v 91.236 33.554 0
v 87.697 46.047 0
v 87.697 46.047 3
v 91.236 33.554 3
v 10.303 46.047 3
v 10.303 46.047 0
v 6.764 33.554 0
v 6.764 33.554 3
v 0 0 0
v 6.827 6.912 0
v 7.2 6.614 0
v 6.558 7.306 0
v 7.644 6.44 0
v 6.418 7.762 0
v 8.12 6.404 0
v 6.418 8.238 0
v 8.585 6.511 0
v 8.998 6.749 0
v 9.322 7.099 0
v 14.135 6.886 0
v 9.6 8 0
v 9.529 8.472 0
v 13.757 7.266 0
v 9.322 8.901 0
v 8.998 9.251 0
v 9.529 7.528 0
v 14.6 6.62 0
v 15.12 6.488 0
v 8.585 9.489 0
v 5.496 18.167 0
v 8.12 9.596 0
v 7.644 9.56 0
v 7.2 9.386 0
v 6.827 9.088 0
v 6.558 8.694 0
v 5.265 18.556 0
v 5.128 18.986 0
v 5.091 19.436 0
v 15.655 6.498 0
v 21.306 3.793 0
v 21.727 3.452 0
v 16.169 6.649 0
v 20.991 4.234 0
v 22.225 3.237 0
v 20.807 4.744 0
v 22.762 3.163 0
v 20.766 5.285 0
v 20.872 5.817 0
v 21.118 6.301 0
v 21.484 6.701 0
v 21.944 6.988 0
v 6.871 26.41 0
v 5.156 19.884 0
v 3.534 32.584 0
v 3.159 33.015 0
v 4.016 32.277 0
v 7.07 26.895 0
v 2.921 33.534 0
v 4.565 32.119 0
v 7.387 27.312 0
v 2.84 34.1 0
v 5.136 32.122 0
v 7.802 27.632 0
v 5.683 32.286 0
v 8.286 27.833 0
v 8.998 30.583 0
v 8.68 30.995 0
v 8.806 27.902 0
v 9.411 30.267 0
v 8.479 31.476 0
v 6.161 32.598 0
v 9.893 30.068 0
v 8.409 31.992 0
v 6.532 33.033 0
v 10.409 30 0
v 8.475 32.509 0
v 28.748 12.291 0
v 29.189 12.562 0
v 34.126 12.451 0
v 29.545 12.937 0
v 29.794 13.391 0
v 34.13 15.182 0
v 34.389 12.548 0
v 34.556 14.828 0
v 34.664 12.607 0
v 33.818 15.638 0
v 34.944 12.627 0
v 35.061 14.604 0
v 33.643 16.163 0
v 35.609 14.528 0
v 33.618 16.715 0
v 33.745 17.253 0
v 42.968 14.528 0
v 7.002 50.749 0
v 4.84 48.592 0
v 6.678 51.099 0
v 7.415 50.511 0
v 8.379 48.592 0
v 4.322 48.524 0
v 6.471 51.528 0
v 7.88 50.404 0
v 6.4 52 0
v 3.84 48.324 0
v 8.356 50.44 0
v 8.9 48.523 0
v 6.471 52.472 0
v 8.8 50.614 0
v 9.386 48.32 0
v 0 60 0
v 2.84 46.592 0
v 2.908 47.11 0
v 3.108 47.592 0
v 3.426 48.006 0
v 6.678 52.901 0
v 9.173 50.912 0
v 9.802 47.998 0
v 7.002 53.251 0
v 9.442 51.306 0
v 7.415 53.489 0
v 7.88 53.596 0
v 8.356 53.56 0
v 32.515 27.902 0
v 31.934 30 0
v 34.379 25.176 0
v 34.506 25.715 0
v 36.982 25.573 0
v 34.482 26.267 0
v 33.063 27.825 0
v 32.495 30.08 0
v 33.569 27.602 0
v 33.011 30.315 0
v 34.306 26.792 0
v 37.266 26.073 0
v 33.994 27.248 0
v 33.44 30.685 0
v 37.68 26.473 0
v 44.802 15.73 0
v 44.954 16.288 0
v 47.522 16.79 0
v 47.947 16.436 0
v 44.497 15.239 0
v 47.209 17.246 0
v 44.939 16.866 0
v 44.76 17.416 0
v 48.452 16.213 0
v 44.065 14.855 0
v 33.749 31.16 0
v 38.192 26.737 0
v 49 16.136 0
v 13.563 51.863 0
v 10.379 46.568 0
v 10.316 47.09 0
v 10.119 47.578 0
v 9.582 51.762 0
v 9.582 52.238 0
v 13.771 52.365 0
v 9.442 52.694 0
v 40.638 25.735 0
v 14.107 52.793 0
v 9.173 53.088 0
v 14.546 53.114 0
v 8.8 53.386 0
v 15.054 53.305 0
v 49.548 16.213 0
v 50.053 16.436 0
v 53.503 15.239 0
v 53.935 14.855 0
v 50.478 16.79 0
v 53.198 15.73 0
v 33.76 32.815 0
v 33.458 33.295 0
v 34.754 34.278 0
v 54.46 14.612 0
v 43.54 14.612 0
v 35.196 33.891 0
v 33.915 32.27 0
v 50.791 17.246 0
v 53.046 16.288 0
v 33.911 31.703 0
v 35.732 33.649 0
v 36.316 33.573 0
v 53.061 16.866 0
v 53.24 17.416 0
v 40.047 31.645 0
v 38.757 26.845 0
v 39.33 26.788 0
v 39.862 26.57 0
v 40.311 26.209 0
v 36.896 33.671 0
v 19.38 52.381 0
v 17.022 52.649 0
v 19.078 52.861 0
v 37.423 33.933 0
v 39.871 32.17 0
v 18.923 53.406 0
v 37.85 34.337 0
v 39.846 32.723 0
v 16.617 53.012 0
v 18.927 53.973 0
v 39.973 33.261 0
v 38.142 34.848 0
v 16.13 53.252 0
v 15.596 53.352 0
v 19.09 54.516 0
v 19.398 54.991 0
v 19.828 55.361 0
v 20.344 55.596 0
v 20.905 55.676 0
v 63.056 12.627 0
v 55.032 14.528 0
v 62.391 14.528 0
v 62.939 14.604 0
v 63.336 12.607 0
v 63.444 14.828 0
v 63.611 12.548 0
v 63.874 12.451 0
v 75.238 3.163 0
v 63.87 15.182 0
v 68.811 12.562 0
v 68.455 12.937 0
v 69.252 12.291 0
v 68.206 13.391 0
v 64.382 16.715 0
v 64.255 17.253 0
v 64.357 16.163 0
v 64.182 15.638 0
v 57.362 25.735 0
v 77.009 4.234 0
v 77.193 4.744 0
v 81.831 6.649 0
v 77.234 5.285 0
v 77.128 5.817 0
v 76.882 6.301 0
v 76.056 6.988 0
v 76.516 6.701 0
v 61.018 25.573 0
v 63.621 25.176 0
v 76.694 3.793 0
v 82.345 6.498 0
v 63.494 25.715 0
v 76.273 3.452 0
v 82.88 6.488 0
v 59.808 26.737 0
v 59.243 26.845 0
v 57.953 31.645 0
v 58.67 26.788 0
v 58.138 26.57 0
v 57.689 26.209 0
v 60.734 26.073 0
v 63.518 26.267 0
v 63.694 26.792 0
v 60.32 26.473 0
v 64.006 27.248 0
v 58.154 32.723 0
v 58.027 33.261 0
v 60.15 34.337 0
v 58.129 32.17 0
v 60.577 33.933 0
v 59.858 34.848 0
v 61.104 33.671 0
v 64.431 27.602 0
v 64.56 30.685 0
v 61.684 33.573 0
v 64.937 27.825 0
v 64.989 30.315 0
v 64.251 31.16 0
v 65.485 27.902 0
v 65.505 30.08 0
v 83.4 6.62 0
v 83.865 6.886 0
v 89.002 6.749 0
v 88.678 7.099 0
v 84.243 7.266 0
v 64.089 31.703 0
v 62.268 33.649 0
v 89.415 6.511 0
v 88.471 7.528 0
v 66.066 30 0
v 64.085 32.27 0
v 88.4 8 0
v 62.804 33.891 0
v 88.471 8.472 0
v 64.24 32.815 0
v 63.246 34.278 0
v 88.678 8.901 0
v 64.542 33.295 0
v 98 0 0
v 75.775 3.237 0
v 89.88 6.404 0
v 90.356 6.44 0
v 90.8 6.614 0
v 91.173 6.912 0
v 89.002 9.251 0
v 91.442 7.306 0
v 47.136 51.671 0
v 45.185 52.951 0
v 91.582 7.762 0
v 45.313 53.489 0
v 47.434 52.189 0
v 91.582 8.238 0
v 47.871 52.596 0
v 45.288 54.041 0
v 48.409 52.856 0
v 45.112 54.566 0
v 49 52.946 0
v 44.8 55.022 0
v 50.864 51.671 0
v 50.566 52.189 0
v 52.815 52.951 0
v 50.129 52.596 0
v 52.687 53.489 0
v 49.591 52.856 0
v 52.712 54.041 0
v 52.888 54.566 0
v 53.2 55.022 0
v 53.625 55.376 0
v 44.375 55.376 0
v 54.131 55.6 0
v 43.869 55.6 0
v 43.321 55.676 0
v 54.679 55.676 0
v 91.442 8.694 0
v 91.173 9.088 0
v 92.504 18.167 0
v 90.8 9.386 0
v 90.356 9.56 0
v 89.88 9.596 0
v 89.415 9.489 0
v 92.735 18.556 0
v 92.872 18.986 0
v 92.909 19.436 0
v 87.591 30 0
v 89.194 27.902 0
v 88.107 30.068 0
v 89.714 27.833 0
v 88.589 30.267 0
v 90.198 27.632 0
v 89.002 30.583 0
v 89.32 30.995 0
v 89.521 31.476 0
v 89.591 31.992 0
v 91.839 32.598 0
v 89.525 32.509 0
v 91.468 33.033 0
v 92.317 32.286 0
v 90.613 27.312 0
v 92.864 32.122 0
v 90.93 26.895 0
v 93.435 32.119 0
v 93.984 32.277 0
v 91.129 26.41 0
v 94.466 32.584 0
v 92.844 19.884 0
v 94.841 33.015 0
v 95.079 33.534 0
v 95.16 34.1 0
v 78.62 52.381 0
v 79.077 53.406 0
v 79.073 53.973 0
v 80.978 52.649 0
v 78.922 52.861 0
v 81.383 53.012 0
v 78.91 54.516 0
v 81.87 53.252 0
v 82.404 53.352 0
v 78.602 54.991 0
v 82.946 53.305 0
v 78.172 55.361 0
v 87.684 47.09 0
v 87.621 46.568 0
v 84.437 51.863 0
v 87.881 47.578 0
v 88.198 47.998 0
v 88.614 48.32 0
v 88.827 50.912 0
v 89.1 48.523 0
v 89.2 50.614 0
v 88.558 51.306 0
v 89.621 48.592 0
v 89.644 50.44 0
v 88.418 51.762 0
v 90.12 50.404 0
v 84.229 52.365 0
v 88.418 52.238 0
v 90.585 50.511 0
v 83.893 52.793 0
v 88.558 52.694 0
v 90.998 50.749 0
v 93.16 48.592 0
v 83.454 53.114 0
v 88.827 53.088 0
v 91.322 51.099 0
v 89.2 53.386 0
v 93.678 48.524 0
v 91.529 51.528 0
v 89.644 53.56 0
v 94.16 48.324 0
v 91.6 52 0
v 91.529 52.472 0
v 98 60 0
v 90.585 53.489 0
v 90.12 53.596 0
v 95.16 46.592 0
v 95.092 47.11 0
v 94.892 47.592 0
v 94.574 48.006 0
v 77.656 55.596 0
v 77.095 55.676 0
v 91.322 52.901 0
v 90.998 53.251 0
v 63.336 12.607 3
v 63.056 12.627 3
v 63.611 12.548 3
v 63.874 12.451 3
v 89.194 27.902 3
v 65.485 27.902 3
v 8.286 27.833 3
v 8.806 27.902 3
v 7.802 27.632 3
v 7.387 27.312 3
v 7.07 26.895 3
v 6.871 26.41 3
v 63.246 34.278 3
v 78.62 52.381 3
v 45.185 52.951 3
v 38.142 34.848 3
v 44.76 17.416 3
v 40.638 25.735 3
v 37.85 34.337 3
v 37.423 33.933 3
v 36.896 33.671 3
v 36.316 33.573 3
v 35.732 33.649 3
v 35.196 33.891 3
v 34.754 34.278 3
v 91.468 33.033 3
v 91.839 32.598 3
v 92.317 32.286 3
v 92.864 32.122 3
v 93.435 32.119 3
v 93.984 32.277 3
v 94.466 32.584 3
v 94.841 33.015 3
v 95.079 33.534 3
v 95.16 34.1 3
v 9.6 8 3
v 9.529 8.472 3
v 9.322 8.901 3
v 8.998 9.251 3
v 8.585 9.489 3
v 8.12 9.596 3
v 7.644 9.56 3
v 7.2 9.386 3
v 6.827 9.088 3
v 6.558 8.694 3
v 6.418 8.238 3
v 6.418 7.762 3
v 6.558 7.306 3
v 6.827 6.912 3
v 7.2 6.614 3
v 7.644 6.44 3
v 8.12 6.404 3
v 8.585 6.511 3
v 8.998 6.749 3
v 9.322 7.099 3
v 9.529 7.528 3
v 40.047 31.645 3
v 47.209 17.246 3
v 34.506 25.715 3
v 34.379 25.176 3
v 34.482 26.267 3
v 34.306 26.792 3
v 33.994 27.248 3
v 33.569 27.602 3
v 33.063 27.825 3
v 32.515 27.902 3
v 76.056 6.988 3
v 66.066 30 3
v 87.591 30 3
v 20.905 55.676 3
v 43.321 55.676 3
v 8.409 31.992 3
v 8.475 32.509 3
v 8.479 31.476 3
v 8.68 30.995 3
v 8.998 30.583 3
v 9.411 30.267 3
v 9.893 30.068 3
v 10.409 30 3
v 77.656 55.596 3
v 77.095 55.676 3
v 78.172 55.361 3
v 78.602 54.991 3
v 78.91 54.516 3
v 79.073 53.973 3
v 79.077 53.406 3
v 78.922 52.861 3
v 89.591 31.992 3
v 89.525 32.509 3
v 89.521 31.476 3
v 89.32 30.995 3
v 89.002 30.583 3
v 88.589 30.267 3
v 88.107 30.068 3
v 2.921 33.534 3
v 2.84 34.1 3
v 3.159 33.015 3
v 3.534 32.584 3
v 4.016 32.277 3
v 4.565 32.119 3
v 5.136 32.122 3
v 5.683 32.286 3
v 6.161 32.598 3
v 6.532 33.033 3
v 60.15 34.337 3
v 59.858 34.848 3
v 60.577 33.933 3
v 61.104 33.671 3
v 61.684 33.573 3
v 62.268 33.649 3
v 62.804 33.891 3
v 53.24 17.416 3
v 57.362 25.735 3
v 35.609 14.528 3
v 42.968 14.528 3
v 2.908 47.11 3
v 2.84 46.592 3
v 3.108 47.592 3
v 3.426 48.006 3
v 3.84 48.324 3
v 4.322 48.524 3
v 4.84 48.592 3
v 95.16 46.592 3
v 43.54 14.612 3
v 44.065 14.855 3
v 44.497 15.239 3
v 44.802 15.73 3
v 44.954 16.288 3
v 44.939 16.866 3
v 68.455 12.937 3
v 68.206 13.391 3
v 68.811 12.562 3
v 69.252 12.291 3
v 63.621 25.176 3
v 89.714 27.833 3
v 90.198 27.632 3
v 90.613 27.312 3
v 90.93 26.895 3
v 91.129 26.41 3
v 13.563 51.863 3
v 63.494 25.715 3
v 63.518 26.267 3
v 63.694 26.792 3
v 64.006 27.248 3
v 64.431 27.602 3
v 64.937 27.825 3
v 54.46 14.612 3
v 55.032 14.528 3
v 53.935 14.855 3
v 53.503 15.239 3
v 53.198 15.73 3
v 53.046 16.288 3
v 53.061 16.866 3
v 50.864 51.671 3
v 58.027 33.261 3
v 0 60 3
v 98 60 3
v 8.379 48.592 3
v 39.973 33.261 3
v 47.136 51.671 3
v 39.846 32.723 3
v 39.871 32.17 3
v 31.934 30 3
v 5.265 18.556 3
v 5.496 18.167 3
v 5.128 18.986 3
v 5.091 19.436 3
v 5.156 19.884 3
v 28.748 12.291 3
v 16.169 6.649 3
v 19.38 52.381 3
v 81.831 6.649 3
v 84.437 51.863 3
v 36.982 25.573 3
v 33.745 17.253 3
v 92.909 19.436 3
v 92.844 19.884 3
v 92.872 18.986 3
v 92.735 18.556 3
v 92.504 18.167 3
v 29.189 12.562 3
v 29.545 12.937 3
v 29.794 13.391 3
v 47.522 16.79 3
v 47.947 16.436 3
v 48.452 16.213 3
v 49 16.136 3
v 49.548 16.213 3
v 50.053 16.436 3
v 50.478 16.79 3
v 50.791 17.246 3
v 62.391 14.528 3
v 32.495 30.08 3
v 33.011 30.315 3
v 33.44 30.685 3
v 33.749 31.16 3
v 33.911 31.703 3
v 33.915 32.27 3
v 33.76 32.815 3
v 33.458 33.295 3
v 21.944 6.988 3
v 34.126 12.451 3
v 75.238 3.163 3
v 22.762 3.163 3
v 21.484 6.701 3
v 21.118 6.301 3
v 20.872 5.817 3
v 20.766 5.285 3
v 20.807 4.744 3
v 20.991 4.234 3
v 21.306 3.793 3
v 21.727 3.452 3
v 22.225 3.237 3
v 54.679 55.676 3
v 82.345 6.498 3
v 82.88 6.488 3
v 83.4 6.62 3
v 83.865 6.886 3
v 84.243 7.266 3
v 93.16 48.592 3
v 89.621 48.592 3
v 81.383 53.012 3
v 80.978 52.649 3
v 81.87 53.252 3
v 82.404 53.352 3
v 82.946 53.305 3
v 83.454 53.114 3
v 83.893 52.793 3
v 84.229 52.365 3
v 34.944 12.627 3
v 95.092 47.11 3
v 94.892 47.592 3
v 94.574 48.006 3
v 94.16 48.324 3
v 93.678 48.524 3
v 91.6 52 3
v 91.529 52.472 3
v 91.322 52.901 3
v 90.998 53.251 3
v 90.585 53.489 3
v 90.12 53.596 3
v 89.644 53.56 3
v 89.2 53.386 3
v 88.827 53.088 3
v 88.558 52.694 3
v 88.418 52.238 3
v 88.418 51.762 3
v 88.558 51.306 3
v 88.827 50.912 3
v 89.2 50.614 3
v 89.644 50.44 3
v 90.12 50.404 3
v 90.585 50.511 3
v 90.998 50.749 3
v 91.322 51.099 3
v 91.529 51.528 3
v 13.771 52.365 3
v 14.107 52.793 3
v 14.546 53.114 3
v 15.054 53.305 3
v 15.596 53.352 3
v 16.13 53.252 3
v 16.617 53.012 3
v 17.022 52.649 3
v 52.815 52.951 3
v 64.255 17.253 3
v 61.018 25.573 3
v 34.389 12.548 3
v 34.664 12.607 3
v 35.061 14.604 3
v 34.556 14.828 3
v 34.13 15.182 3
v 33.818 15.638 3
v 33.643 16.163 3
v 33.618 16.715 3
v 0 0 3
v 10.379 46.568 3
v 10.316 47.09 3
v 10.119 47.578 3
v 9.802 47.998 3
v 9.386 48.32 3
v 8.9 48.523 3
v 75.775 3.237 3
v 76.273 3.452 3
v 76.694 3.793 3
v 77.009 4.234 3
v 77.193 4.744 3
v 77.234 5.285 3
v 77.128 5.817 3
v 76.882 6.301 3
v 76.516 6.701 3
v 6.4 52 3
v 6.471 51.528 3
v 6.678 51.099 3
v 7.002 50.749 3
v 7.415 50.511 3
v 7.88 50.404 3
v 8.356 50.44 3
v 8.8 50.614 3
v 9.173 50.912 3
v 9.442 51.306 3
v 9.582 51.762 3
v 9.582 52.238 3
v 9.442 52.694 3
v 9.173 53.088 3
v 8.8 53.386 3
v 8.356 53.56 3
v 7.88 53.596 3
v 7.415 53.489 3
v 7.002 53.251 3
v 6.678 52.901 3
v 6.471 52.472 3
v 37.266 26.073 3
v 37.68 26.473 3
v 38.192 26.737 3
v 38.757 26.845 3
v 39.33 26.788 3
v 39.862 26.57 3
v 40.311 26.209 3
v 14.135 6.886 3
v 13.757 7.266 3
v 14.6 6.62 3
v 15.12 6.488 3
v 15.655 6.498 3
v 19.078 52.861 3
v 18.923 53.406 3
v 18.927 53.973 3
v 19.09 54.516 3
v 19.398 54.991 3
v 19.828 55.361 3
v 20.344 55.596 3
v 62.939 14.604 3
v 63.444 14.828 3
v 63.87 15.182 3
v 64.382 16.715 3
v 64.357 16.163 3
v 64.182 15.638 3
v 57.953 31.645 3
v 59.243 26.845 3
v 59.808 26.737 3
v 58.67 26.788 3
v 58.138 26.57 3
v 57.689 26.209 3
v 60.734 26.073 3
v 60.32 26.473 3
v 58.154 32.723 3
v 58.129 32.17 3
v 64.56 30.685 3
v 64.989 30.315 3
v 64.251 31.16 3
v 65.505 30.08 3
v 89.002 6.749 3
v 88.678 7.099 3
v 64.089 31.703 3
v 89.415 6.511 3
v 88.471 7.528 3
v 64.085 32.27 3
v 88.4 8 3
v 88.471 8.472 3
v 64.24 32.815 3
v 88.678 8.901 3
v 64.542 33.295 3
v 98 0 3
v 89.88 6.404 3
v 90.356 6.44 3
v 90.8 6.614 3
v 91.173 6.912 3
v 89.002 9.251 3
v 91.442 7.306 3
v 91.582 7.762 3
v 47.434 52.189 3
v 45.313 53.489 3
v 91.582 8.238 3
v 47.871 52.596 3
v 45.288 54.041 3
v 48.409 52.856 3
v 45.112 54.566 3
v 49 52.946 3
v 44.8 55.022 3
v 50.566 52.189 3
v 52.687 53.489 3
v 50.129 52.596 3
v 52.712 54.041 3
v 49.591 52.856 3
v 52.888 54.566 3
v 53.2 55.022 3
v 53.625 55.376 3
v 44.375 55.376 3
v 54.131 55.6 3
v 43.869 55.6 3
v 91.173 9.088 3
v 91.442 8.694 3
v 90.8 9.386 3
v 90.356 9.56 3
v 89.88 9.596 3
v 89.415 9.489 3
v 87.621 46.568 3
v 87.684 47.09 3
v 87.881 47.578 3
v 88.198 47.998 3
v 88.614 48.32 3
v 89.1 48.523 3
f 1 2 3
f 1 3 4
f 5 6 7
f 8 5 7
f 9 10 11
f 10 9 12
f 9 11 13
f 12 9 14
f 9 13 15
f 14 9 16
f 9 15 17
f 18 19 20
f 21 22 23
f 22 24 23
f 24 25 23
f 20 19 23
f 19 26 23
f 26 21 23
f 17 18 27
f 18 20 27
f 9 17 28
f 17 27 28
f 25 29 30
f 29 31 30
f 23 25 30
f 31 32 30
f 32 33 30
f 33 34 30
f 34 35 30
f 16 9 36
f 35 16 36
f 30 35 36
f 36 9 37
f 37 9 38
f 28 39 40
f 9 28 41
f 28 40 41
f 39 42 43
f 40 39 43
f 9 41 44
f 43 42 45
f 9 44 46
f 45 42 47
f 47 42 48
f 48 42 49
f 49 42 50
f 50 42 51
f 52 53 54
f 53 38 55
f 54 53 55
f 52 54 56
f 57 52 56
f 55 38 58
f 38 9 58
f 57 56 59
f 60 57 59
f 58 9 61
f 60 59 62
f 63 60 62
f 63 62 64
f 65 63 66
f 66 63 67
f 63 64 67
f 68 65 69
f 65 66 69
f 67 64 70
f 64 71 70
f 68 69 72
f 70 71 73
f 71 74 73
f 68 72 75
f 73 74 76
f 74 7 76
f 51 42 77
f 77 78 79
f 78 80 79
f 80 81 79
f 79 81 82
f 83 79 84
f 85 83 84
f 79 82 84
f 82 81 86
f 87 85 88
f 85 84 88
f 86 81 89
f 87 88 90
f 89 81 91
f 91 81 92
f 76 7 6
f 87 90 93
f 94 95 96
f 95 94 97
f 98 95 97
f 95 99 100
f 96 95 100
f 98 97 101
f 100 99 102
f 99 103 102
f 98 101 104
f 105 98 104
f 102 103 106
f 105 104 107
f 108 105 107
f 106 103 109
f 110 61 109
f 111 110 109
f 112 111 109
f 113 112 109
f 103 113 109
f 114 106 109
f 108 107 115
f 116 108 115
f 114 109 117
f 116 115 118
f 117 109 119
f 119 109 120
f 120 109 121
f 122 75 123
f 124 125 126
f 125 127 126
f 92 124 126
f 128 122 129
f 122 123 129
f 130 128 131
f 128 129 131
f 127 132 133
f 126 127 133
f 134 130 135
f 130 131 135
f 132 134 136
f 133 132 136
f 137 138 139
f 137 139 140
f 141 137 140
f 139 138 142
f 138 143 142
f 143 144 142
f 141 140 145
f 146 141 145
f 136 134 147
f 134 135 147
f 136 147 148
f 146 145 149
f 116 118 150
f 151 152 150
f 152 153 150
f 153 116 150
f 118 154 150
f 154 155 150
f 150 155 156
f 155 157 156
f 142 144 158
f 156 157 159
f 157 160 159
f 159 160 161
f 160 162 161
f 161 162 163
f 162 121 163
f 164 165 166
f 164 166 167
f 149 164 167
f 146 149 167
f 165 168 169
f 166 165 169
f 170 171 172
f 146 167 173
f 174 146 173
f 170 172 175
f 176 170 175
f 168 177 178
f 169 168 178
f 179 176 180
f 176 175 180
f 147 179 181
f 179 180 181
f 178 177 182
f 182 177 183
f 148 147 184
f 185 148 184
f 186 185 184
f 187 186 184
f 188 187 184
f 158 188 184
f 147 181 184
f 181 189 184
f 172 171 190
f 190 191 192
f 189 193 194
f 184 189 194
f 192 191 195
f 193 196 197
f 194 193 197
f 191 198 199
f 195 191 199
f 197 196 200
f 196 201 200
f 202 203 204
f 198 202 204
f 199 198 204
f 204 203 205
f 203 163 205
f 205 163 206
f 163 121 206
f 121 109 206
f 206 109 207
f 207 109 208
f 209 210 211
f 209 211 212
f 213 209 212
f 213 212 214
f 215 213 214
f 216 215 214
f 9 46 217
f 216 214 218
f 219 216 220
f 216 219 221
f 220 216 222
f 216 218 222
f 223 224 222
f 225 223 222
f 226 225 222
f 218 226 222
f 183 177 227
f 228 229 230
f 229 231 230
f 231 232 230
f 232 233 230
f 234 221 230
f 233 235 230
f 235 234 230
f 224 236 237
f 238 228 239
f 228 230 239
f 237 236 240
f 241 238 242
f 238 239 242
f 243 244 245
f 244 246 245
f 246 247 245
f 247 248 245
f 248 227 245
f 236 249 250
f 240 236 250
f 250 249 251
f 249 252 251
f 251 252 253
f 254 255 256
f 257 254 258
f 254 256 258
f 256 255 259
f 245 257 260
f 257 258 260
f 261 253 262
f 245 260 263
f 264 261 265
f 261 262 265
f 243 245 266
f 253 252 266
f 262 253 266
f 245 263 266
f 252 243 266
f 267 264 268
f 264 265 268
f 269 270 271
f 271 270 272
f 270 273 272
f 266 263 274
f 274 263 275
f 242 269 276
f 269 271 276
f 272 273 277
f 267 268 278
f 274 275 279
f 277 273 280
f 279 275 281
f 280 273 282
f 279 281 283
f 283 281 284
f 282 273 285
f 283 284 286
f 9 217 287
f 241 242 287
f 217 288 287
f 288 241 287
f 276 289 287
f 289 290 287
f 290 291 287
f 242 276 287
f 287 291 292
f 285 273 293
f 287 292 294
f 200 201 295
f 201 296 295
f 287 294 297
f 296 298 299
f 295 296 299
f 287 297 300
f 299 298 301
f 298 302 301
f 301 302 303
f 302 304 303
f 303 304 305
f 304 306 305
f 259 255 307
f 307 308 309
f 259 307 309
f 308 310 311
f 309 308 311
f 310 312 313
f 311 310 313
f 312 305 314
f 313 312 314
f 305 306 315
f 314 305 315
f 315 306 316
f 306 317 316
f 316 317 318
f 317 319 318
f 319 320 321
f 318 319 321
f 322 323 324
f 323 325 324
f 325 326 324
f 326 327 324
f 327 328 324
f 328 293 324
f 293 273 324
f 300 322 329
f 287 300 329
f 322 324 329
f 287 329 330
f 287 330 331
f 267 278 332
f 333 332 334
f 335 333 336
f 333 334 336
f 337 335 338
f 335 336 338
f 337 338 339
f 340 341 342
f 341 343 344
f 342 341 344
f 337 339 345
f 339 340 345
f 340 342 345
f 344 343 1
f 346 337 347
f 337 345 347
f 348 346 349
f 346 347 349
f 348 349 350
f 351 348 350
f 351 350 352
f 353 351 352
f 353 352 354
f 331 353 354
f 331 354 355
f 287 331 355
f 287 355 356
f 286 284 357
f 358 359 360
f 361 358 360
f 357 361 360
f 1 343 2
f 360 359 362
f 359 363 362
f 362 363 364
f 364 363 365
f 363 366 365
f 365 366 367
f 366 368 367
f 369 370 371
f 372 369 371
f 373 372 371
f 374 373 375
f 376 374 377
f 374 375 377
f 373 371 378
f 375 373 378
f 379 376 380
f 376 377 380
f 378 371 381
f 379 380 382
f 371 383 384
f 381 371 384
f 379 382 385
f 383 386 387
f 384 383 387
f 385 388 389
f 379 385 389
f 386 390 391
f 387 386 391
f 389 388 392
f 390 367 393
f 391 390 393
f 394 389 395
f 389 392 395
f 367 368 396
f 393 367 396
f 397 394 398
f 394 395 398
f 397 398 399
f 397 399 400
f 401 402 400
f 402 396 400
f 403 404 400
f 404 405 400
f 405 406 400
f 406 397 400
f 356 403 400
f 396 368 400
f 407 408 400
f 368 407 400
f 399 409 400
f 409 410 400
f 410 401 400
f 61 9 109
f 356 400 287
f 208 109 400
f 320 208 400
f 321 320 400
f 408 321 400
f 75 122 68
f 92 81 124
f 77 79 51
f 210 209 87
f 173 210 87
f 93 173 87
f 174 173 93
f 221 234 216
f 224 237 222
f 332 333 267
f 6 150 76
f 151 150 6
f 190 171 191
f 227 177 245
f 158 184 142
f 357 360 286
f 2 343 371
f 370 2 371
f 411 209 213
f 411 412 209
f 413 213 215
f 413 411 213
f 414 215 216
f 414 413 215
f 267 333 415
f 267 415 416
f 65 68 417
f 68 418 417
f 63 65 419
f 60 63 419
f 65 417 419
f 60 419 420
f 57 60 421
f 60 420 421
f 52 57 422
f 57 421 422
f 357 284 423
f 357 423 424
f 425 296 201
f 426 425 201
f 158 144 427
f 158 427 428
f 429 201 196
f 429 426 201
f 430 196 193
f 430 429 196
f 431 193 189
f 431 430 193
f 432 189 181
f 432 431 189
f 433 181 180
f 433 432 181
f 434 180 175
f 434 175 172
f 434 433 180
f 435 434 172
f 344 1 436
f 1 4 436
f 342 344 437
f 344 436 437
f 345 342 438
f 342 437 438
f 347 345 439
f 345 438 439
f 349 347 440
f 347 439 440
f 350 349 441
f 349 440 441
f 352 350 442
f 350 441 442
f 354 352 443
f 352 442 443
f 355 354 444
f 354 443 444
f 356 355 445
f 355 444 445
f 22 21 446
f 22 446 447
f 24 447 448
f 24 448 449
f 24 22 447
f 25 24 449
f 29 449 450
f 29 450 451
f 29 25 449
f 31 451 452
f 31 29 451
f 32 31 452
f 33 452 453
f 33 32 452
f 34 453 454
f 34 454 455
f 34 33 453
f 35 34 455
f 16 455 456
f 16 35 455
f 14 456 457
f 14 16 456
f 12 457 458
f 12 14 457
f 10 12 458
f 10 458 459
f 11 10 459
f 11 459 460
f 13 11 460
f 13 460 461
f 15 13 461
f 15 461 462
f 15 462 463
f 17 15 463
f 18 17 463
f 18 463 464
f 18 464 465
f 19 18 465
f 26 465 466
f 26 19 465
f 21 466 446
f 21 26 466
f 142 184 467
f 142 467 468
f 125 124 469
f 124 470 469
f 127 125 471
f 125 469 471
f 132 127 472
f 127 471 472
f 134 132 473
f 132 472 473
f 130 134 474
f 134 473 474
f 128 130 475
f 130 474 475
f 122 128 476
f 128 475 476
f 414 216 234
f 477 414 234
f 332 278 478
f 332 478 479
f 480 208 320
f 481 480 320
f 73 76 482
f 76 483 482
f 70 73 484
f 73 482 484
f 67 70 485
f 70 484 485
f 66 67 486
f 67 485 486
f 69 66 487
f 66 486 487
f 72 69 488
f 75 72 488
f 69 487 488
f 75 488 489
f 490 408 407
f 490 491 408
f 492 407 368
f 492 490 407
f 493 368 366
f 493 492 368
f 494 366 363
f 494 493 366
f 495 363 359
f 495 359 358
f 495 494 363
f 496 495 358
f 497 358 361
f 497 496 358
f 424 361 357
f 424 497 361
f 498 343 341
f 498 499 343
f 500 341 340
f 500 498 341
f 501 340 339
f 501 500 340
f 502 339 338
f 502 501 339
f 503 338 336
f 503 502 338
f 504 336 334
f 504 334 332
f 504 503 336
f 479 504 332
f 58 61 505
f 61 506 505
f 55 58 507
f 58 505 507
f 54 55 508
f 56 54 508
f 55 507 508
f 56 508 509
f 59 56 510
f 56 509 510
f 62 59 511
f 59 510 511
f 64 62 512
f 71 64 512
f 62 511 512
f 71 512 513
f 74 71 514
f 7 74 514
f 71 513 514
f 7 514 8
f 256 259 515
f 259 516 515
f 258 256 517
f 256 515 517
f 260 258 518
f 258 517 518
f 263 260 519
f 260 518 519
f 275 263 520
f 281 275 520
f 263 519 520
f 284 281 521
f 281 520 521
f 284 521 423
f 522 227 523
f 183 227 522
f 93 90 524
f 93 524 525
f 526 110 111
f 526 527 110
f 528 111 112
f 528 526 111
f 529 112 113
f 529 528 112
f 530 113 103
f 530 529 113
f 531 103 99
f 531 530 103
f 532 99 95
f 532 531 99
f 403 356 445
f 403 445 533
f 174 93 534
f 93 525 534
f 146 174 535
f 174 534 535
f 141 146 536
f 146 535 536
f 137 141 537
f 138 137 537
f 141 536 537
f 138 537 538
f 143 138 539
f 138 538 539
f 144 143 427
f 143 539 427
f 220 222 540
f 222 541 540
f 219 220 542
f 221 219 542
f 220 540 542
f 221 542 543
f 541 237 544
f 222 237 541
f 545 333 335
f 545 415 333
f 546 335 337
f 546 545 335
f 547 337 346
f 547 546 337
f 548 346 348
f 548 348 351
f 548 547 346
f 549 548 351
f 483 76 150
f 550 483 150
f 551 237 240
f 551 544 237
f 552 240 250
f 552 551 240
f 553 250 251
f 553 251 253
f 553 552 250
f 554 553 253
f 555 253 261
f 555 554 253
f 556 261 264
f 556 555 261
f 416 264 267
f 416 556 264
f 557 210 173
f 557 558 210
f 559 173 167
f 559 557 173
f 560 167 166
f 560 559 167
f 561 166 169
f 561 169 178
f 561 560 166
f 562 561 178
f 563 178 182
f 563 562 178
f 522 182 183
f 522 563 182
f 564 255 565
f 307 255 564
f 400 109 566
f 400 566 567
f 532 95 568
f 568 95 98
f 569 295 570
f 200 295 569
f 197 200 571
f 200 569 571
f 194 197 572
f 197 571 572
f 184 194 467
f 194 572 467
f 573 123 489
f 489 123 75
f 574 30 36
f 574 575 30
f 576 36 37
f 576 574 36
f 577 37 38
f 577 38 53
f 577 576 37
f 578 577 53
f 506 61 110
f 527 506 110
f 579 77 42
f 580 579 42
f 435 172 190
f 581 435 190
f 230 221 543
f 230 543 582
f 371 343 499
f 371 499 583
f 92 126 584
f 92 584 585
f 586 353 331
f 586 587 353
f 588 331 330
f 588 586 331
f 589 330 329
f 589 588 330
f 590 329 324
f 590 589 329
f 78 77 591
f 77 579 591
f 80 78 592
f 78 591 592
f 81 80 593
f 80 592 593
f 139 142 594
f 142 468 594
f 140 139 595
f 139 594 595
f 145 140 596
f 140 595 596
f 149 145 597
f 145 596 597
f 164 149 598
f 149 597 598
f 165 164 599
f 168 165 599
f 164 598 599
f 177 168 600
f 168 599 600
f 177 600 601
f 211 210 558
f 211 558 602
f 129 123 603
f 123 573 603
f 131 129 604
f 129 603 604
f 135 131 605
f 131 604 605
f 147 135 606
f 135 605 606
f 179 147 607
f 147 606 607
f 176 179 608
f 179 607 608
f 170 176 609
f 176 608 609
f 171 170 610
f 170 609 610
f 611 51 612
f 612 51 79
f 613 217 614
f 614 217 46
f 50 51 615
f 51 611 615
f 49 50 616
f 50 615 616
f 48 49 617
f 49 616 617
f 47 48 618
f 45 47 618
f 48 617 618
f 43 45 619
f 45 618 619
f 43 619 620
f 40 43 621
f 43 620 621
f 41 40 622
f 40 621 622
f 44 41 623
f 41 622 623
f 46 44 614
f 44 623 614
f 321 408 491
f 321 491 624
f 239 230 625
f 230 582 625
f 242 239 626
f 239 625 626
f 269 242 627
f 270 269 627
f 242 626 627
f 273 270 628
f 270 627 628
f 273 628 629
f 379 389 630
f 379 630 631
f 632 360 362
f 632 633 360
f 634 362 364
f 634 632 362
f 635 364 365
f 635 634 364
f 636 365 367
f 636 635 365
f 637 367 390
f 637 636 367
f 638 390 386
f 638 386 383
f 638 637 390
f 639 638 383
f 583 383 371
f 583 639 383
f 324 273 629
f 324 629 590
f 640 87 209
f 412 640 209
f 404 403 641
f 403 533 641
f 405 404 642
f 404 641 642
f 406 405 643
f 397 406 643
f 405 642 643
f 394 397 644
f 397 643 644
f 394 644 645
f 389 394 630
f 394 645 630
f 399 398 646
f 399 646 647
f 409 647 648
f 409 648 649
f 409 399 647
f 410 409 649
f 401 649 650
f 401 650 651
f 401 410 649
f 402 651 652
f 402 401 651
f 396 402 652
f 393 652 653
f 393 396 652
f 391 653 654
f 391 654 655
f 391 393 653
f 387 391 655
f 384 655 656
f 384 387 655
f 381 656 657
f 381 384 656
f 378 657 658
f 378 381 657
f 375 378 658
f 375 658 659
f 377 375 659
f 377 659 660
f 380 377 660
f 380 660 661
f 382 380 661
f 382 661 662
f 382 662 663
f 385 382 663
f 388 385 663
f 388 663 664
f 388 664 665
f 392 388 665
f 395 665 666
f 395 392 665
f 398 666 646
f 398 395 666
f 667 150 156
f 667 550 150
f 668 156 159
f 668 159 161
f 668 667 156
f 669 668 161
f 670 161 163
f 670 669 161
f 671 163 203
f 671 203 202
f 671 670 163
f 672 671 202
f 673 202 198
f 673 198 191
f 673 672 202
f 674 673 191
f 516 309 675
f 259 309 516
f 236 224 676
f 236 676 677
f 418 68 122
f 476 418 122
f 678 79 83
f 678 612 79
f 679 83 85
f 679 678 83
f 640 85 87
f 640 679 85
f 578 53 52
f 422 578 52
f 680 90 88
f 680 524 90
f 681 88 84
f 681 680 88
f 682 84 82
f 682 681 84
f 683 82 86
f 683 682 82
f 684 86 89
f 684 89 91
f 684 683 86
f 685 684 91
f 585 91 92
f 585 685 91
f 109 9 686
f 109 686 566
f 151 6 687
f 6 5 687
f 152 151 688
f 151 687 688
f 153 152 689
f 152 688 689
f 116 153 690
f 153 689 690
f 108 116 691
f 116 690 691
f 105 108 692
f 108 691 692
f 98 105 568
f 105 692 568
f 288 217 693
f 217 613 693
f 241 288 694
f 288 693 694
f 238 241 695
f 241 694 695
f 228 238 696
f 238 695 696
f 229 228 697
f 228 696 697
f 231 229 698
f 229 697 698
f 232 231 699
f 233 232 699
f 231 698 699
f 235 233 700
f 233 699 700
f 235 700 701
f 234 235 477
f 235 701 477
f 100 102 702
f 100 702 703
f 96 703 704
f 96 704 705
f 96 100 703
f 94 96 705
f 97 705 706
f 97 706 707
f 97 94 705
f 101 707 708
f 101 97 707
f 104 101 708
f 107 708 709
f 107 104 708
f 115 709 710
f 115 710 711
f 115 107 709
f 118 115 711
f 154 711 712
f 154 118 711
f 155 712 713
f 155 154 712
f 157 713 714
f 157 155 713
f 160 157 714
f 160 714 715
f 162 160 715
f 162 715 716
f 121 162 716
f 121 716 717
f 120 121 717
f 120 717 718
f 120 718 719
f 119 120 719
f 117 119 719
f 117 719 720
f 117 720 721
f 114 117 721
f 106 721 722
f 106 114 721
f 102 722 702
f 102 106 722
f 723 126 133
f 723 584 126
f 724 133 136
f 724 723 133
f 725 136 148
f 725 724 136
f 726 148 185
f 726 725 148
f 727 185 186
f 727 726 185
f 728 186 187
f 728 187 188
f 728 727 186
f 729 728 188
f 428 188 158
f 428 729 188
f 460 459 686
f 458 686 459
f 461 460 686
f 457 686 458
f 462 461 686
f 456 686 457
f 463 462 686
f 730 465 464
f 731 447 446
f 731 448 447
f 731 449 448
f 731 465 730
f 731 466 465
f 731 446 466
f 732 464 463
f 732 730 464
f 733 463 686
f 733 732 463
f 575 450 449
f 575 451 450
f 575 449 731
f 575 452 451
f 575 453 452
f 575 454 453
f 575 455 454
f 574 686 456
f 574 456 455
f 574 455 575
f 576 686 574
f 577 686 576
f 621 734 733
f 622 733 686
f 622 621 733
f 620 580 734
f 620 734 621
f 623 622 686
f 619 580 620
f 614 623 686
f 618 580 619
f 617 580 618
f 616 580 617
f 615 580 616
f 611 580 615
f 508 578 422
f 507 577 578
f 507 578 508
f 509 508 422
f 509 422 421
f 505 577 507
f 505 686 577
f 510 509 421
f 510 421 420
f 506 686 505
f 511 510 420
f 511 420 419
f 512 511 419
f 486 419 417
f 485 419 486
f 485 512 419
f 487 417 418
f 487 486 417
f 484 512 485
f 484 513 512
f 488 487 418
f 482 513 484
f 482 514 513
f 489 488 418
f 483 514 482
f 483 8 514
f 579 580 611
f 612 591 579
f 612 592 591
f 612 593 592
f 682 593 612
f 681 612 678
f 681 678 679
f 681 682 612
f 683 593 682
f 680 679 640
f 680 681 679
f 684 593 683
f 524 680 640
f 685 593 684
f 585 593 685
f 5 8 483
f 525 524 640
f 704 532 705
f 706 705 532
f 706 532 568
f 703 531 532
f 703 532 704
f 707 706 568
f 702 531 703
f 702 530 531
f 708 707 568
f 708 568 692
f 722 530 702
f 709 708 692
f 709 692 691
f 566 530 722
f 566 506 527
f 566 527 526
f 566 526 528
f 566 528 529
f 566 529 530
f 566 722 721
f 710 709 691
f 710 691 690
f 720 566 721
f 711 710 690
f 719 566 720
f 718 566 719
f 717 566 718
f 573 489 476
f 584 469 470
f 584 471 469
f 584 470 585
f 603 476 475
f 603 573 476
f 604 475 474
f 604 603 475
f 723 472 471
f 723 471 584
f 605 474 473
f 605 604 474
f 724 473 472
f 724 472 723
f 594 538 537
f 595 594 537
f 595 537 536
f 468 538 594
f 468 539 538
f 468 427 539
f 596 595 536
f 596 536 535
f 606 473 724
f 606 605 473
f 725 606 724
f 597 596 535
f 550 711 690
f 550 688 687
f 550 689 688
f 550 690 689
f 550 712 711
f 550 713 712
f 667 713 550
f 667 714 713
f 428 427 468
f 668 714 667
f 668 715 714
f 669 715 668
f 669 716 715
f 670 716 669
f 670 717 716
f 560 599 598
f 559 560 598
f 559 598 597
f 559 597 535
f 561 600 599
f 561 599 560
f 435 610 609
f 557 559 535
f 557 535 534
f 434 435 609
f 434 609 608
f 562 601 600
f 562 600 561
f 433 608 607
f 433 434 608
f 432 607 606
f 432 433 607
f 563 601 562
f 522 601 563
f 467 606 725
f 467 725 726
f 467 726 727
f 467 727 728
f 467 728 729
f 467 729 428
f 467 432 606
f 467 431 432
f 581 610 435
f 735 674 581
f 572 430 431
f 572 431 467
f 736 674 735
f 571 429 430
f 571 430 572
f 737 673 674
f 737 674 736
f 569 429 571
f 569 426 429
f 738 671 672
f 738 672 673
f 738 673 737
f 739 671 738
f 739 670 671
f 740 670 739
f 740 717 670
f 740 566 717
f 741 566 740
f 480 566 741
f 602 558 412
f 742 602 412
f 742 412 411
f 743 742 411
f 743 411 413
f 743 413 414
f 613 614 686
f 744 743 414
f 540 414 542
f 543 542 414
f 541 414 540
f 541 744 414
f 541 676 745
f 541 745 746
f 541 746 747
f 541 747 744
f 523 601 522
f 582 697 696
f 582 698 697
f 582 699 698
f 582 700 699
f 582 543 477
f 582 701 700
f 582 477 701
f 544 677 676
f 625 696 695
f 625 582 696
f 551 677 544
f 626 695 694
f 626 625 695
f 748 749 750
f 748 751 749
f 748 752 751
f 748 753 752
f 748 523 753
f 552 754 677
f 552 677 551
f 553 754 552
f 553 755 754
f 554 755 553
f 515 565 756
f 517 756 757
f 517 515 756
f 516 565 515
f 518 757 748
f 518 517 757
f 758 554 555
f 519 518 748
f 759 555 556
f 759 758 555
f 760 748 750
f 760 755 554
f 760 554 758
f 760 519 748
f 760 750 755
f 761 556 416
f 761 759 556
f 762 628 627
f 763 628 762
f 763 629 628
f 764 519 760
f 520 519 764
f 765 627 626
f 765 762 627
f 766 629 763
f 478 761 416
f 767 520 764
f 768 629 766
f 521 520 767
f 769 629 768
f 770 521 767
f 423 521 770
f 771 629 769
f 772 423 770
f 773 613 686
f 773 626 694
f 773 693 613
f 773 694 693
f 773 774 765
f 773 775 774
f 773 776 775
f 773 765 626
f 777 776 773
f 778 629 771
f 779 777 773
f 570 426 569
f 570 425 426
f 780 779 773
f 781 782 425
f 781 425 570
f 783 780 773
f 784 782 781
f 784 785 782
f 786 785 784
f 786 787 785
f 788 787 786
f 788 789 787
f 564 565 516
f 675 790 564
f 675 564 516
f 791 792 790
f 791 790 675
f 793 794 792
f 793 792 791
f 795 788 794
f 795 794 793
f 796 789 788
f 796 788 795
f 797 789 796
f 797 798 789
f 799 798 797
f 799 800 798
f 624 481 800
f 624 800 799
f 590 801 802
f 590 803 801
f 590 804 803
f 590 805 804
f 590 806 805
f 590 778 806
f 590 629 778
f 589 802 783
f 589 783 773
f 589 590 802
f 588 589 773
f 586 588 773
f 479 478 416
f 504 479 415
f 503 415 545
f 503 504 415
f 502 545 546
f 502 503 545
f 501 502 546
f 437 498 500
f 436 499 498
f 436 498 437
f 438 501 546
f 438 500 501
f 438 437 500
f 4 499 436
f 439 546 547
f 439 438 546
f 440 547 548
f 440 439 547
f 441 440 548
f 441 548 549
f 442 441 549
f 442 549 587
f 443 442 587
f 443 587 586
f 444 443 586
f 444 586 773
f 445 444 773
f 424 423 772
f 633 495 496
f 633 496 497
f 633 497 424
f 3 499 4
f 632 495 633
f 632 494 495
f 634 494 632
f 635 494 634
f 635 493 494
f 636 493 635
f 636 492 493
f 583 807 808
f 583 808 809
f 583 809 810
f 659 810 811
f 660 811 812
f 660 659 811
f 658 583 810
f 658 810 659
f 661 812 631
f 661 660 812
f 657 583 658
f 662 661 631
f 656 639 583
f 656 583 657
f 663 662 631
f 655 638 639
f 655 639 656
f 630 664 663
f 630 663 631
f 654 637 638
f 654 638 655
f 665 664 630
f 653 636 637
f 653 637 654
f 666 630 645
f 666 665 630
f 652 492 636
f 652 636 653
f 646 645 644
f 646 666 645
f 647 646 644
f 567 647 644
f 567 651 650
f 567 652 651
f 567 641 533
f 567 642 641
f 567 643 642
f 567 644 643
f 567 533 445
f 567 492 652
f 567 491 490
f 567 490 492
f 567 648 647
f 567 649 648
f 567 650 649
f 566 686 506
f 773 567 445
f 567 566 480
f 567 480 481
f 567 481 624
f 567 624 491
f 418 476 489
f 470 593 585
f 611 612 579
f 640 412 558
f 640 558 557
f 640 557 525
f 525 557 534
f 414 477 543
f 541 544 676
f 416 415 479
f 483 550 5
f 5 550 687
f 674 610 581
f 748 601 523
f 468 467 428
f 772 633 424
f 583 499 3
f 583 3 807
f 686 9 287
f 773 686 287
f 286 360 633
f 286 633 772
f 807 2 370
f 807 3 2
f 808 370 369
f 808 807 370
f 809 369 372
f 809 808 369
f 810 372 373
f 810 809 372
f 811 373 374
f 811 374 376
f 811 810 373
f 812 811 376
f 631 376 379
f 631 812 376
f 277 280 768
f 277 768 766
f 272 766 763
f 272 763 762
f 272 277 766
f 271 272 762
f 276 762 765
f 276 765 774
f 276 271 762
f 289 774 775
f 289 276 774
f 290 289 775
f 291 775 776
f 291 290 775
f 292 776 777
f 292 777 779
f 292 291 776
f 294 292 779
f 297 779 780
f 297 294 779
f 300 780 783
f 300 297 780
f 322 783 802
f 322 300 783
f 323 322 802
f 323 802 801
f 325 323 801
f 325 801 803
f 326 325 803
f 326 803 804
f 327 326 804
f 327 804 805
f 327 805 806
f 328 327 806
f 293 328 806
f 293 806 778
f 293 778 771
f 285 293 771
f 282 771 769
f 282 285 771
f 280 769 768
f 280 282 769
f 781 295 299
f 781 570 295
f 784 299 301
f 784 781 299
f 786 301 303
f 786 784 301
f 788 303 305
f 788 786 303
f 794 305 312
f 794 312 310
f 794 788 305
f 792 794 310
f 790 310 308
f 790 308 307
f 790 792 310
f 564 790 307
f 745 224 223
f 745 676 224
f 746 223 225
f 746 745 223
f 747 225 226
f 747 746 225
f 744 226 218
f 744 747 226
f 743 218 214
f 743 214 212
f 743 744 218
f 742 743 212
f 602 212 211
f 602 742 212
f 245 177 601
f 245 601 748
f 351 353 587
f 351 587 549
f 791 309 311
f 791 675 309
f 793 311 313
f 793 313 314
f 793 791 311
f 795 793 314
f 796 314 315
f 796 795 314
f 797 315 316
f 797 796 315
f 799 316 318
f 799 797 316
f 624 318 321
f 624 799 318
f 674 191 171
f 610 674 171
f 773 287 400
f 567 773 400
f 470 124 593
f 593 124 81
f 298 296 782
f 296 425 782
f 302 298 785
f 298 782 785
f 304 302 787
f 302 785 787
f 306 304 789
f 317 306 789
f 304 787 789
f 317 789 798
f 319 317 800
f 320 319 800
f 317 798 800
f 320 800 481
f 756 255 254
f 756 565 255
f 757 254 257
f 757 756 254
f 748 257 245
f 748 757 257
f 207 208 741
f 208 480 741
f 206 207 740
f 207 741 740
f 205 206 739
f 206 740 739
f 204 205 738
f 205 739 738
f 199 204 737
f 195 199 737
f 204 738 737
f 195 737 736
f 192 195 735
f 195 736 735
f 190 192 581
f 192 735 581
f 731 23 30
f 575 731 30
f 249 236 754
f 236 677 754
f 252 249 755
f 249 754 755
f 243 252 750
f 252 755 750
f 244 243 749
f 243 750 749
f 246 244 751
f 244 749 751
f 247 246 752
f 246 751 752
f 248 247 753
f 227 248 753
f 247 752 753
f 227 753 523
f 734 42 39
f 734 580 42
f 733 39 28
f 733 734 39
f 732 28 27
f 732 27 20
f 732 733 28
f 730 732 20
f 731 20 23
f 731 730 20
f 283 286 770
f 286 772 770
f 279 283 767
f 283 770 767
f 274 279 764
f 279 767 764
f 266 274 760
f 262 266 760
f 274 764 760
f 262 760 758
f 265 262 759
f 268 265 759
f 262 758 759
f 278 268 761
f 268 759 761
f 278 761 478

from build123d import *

# Parameters (mm, degrees)
SKETCH_1_W      = 98
SKETCH_1_H      = 60
SKETCH_1_R      = 1.6
EXTRUDE_1_DEPTH = 3
FILLET_4_R      = 2


with BuildPart() as part:
    # 草图1 → 凸台-拉伸1 (new body)
    with BuildSketch(Plane.XY):
        with Locations((49, 30)):
            Rectangle(SKETCH_1_W, SKETCH_1_H)
        with Locations((8, 8)):
            Circle(SKETCH_1_R, mode=Mode.SUBTRACT)
        with Locations(Location((90, 8, 0), (0, 0, 180))):
            Circle(SKETCH_1_R, mode=Mode.SUBTRACT)
        with Locations((90, 52)):
            Circle(SKETCH_1_R, mode=Mode.SUBTRACT)
        with Locations(Location((8, 52, 0), (0, 0, 180))):
            Circle(SKETCH_1_R, mode=Mode.SUBTRACT)
        Polygon((49, 56.461504081), (39.652852225, 32.437112926), (49, 13.645736298), (58.347147775, 32.437112926), align=None, mode=Mode.SUBTRACT)
        Polygon((32.684961024, 14.527976606), (46.19127915, 14.527976606), (38.625617, 29.796874275), align=None, mode=Mode.SUBTRACT)
        Polygon((65.315038976, 14.527976606), (59.374383, 29.796874275), (51.80872085, 14.527976606), align=None, mode=Mode.SUBTRACT)
        Polygon((51.754435798, 55.675997791), (61.074674823, 31.720768521), (81.417430018, 55.675997791), align=None, mode=Mode.SUBTRACT)
        Polygon((83.46136082, 55.573734568), (61.744172649, 30), (90.184817286, 30), align=None, mode=Mode.SUBTRACT)
        Polygon((62.560585094, 27.901625993), (68.503620332, 12.626613057), (83.282124763, 5.998312223), (93.091894324, 18.94247075), (90.736489794, 27.901625993), align=None, mode=Mode.SUBTRACT)
        Polygon((34.516229814, 12.626613057), (63.483770186, 12.626613057), (84.583930387, 3.16298904), (13.416069613, 3.16298904), align=None, mode=Mode.SUBTRACT)
        Polygon((14.717875237, 5.998312223), (4.908105676, 18.94247075), (7.263510206, 27.901625993), (35.439414906, 27.901625993), (29.496379668, 12.626613057), align=None, mode=Mode.SUBTRACT)
        Polygon((14.53863918, 55.573734568), (36.255827351, 30), (7.815182714, 30), align=None, mode=Mode.SUBTRACT)
        Polygon((36.925325177, 31.720768521), (16.582569982, 55.675997791), (46.245564202, 55.675997791), align=None, mode=Mode.SUBTRACT)
        Polygon((2.839889493, 48.591962143), (11.02417284, 48.591962143), (2.839889493, 19.702141439), align=None, mode=Mode.SUBTRACT)
        Polygon((86.97582716, 48.591962143), (95.160110507, 19.702141439), (95.160110507, 48.591962143), align=None, mode=Mode.SUBTRACT)
    extrude(amount=EXTRUDE_1_DEPTH)

    # 圆角4
    fillet_4_edges = [part.edges().sort_by_distance(p)[0] for p in [
        (90.736489794, 27.901625993, 1.5),
        (62.560585094, 27.901625993, 1.5),
        (2.839889493, 48.591962143, 1.5),
        (2.839889493, 19.702141439, 1.5),
        (11.02417284, 48.591962143, 1.5),
        (95.160110507, 48.591962143, 1.5),
        (86.97582716, 48.591962143, 1.5),
        (95.160110507, 19.702141439, 1.5),
        (35.439414906, 27.901625993, 1.5),
        (7.263510206, 27.901625993, 1.5),
        (4.908105676, 18.94247075, 1.5),
        (14.717875237, 5.998312223, 1.5),
        (29.496379668, 12.626613057, 1.5),
        (14.53863918, 55.573734568, 1.5),
        (7.815182714, 30, 1.5),
        (36.255827351, 30, 1.5),
        (36.925325177, 31.720768521, 1.5),
        (46.245564202, 55.675997791, 1.5),
        (16.582569982, 55.675997791, 1.5),
        (58.347147775, 32.437112926, 1.5),
        (49, 56.461504081, 1.5),
        (39.652852225, 32.437112926, 1.5),
        (49, 13.645736298, 1.5),
        (38.625617, 29.796874275, 1.5),
        (32.684961024, 14.527976606, 1.5),
        (46.19127915, 14.527976606, 1.5),
        (81.417430018, 55.675997791, 1.5),
        (51.754435798, 55.675997791, 1.5),
        (61.074674823, 31.720768521, 1.5),
        (51.80872085, 14.527976606, 1.5),
        (65.315038976, 14.527976606, 1.5),
        (59.374383, 29.796874275, 1.5),
        (90.184817286, 30, 1.5),
        (83.46136082, 55.573734568, 1.5),
        (61.744172649, 30, 1.5),
        (34.516229814, 12.626613057, 1.5),
        (13.416069613, 3.16298904, 1.5),
        (84.583930387, 3.16298904, 1.5),
        (63.483770186, 12.626613057, 1.5),
        (68.503620332, 12.626613057, 1.5),
        (83.282124763, 5.998312223, 1.5),
        (93.091894324, 18.94247075, 1.5),
    ]]
    fillet(fillet_4_edges, radius=FILLET_4_R)


solid = part.part
